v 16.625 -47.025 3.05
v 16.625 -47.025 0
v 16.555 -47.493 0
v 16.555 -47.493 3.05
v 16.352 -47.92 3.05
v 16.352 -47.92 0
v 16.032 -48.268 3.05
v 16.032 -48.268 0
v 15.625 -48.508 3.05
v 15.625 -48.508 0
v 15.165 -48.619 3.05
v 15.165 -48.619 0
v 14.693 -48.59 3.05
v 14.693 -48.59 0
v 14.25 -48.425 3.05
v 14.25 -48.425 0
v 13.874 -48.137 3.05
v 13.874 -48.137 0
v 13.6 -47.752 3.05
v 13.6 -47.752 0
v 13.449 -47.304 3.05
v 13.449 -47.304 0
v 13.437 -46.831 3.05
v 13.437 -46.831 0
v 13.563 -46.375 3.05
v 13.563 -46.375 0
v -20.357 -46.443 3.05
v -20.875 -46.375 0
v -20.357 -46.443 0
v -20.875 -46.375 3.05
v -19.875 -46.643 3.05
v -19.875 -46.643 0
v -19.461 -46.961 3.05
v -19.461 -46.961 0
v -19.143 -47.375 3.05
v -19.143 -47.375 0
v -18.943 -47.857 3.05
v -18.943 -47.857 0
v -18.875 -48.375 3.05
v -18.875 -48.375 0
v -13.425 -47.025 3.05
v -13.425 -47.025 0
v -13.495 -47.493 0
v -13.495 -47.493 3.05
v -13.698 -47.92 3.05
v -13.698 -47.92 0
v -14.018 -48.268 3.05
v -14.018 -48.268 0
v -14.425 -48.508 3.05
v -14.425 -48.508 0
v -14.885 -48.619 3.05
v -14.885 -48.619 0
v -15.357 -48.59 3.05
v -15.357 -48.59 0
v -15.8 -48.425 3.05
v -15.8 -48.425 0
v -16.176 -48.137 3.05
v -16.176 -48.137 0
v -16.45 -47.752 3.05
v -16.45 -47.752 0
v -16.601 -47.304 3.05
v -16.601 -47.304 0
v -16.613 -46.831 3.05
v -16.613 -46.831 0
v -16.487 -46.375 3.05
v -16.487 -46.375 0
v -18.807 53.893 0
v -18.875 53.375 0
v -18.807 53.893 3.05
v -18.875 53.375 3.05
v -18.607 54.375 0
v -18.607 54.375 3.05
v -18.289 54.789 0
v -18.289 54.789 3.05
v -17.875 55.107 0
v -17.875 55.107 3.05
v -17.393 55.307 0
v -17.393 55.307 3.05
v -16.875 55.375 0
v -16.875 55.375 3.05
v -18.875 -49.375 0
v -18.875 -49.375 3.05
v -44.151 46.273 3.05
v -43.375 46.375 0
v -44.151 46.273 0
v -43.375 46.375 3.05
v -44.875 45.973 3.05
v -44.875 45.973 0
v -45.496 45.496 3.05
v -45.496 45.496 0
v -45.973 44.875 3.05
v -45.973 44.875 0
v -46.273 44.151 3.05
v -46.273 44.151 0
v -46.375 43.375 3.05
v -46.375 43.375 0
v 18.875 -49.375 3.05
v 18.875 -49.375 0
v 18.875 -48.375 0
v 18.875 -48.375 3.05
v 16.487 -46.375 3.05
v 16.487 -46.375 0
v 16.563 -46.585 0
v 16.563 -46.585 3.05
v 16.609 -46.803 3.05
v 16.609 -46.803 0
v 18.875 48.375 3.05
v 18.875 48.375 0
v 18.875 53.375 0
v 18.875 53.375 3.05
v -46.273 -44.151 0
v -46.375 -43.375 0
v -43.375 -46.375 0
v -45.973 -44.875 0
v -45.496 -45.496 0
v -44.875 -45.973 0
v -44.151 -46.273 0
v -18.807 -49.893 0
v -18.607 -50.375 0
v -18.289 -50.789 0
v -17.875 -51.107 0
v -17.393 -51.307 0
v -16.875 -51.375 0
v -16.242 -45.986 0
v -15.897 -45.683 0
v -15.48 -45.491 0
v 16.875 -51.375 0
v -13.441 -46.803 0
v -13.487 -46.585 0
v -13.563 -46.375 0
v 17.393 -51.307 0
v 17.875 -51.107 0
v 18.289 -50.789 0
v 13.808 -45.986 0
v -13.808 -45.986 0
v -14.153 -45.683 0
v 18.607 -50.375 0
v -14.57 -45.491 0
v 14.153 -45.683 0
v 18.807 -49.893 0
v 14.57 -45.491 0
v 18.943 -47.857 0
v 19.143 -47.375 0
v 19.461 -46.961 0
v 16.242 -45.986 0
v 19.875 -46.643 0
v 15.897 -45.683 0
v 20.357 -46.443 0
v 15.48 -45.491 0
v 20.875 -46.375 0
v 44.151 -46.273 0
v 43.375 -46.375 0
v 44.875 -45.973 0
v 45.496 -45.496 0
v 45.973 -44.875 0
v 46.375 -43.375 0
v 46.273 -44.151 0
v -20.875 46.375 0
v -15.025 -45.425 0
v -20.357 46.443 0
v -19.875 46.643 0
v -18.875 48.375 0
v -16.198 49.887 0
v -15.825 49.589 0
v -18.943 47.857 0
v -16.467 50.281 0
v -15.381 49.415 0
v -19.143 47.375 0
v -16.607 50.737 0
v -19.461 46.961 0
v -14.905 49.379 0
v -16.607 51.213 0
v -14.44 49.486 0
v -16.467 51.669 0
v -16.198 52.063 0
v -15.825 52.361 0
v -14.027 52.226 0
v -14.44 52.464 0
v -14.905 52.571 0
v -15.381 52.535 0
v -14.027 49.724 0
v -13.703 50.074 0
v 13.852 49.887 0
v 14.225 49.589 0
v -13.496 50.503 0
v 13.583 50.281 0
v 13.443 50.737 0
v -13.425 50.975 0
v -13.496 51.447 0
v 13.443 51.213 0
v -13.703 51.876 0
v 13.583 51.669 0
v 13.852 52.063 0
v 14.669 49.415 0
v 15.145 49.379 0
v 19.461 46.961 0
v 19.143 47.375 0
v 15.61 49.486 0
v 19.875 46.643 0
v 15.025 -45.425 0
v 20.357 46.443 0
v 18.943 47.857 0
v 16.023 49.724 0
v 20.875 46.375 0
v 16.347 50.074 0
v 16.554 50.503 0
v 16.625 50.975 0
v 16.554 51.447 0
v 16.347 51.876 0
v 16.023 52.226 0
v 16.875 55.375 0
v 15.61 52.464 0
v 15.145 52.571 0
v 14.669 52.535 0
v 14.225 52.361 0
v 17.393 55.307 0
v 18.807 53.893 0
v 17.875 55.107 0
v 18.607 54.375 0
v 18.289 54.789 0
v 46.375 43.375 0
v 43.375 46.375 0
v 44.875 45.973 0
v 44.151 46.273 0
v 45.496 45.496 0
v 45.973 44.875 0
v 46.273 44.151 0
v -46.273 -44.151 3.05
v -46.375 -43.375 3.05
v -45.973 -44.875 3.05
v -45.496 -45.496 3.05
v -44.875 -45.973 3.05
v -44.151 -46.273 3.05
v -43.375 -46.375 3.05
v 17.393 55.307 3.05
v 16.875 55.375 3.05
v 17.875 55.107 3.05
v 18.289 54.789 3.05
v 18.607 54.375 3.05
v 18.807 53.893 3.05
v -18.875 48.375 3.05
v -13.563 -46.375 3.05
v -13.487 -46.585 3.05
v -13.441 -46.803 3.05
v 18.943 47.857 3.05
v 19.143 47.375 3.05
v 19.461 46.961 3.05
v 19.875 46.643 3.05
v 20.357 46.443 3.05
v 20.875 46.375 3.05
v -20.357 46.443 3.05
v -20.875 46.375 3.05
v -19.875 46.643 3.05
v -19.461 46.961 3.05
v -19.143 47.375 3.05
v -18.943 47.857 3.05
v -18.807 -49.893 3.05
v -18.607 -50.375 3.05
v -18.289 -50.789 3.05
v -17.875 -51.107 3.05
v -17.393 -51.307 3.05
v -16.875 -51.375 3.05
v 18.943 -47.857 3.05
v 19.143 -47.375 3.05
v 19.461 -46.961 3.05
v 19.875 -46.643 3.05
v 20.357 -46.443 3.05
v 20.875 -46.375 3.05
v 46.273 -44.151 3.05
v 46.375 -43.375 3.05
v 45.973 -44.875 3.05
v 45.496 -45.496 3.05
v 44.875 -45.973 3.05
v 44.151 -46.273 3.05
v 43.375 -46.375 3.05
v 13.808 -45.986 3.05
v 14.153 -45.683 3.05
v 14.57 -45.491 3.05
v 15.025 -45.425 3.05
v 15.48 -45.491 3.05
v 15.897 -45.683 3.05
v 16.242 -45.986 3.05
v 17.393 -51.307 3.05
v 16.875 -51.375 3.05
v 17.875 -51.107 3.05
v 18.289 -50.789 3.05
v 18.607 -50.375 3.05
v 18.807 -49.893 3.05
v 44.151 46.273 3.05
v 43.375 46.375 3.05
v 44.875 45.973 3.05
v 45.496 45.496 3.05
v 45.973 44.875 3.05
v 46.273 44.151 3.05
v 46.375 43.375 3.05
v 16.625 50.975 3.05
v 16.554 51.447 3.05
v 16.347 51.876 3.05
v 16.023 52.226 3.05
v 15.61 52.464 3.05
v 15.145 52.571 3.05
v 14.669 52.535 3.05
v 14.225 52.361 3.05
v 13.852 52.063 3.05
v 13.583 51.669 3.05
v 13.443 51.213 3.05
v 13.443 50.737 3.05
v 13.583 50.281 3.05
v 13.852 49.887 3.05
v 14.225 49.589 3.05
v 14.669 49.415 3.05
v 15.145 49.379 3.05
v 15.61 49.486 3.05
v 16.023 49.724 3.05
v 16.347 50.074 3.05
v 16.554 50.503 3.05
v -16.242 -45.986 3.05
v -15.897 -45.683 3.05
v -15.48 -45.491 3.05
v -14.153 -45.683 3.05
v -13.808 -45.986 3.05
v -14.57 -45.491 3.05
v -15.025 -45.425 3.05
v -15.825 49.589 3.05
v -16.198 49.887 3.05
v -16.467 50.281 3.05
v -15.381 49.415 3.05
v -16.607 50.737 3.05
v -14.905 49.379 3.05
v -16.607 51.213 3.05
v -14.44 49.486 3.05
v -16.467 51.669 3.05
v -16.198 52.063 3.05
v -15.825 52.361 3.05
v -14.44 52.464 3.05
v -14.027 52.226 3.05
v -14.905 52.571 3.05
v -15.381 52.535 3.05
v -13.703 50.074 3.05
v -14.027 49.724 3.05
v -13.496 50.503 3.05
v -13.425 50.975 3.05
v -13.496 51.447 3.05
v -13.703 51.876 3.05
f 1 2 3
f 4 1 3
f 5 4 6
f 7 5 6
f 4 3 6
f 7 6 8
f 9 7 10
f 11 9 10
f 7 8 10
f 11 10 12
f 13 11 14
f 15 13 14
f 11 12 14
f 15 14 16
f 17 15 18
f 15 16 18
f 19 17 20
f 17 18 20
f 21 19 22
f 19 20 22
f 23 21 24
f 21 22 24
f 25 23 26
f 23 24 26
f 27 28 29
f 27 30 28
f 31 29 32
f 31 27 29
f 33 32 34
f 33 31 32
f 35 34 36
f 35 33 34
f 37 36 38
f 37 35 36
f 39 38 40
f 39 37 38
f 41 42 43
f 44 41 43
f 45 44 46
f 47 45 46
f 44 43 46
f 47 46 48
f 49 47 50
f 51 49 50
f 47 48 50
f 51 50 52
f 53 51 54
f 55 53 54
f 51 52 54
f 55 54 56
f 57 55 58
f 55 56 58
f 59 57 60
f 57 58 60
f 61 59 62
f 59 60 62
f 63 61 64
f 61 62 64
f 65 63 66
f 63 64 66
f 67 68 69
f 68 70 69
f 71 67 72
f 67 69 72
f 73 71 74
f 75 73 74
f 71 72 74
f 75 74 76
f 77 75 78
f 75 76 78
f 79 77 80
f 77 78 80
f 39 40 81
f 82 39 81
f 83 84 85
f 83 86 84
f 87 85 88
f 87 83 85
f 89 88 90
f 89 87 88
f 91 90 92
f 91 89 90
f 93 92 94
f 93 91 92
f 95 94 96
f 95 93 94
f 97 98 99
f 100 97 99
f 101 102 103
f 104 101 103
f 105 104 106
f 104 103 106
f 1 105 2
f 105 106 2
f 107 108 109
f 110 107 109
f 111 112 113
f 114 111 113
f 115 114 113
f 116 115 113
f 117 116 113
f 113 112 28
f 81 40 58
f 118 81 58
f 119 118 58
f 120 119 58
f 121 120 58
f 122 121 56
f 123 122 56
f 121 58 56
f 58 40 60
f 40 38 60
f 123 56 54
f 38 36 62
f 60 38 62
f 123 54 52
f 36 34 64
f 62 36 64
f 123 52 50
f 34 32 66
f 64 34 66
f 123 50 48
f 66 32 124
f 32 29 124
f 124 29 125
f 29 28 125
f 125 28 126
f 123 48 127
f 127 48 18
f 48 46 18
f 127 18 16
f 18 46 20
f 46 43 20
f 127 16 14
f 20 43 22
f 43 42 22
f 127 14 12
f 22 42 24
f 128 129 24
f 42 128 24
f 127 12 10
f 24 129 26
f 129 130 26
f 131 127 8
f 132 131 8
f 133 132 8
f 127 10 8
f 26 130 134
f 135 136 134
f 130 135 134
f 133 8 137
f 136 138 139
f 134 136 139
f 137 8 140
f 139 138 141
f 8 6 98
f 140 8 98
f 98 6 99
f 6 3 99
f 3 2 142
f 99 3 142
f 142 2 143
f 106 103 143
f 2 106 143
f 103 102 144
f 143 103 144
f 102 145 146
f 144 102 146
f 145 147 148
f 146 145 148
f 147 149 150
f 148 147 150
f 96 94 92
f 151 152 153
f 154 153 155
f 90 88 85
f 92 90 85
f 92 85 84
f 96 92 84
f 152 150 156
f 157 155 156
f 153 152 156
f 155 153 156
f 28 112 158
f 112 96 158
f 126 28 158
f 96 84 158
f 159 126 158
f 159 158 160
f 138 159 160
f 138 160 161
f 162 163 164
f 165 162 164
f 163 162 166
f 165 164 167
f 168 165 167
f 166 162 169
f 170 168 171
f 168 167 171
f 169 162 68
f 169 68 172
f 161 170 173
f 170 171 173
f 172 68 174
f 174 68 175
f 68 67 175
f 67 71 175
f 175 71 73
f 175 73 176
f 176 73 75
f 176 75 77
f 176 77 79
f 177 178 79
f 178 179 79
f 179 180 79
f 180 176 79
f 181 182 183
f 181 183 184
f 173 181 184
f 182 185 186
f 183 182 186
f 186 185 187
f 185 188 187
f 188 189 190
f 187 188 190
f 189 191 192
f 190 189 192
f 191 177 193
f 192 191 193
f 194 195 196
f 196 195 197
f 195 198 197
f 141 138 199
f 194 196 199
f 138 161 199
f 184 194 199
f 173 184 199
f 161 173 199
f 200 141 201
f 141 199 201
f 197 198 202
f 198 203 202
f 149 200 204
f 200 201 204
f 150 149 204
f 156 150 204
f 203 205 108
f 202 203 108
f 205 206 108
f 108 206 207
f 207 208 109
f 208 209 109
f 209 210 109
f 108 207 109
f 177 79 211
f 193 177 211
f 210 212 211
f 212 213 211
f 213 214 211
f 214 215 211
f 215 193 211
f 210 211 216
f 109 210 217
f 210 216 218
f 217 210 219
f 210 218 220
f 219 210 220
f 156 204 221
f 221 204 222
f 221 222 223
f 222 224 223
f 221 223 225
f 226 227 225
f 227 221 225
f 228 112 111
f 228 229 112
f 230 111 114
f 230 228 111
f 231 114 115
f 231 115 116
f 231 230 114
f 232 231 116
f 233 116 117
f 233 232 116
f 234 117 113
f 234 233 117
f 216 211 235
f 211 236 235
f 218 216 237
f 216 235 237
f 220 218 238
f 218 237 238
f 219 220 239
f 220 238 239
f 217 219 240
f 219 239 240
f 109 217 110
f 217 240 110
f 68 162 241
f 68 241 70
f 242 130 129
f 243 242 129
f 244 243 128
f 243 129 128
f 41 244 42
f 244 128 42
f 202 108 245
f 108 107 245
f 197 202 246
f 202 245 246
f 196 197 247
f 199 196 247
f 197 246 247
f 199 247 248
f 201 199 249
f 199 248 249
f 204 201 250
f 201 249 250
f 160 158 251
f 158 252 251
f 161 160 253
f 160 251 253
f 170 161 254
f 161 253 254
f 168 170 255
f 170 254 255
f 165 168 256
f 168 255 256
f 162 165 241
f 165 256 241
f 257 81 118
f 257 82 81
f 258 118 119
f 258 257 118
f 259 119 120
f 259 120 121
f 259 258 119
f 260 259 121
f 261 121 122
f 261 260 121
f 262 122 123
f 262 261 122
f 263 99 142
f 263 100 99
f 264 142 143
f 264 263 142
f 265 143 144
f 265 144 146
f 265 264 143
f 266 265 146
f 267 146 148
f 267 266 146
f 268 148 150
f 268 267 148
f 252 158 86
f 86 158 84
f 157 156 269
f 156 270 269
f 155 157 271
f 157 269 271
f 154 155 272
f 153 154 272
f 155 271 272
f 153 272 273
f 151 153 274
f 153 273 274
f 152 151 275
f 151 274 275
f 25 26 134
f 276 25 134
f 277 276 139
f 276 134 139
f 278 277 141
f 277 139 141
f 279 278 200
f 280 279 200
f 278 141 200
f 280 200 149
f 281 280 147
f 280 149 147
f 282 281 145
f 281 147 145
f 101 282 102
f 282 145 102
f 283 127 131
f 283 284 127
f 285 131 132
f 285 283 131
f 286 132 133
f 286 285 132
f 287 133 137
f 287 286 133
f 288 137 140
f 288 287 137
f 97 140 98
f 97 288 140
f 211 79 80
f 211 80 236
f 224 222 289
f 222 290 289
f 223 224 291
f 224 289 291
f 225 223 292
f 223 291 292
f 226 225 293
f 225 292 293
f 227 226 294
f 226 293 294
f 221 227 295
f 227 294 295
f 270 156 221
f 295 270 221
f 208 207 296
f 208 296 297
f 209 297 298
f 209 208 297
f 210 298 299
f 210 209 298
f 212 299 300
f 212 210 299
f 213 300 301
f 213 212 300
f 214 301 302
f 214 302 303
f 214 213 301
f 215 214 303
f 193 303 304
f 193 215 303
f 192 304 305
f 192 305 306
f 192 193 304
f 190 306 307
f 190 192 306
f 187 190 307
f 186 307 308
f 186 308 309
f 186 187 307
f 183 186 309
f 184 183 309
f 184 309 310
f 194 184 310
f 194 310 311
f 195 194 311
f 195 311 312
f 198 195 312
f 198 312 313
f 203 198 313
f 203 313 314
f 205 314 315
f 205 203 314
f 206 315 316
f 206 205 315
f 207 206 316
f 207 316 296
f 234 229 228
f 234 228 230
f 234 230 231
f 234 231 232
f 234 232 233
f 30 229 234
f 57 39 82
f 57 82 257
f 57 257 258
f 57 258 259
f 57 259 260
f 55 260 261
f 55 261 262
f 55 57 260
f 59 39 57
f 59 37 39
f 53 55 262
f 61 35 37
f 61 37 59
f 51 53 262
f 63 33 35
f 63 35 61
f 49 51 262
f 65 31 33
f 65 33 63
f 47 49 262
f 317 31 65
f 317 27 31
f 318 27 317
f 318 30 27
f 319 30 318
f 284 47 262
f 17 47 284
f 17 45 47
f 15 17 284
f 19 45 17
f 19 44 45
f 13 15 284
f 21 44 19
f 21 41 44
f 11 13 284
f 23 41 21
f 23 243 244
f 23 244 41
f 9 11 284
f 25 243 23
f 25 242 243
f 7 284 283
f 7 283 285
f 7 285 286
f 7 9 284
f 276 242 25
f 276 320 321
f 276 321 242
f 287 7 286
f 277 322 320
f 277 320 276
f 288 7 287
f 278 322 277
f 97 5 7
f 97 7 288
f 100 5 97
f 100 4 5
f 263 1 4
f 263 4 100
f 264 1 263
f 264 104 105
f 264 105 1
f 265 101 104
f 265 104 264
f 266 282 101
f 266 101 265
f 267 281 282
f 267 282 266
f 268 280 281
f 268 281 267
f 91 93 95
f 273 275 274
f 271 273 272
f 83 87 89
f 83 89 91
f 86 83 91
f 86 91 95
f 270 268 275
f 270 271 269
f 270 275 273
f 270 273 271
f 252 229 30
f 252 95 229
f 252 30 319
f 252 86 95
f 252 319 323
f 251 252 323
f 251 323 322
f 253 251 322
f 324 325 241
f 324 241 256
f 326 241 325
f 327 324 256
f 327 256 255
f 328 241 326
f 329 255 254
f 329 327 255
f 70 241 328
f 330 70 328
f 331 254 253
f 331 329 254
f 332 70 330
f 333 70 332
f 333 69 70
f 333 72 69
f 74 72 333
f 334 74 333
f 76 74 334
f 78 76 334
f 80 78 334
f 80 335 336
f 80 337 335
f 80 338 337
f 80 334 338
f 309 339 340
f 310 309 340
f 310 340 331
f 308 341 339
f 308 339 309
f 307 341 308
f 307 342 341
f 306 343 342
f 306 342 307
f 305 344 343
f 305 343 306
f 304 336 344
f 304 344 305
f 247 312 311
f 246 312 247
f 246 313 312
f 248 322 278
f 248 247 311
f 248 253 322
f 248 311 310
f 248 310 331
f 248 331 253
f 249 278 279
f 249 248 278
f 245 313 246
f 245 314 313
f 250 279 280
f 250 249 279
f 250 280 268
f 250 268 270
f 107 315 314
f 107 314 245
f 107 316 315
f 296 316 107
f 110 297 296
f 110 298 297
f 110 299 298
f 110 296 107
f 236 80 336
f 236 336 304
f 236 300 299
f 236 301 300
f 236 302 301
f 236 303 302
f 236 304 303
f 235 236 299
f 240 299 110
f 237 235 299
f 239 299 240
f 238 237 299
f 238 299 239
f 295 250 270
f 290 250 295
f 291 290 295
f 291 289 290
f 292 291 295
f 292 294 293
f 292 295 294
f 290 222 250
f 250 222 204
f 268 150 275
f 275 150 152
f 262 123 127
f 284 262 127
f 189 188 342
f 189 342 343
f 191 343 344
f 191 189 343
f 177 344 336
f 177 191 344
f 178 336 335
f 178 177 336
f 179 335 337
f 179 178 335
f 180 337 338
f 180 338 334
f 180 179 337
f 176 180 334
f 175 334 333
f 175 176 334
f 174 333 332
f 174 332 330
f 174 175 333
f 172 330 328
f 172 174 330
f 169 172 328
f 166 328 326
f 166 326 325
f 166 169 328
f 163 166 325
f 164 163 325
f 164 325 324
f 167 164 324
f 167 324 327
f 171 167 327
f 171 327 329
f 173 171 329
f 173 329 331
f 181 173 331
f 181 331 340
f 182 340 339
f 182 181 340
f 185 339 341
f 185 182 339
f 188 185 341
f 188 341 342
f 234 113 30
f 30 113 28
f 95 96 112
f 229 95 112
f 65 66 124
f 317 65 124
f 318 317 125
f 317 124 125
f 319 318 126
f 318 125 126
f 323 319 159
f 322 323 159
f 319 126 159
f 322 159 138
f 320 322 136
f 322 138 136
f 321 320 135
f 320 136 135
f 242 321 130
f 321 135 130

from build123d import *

# Parameters (mm, degrees)
F0_W     = 37.75
F0_H     = 9
F0_R     = 1.6
F1_DEPTH = 3.05
F2_R     = 2
F3_R     = 3


with BuildPart() as f1:
    # F0 (on Top) → F1 (new body)
    with BuildSketch(Plane.XY):
        with BuildLine():
            Line((-18.875, 46.375), (-46.375, 46.375))
            Line((-46.375, 46.375), (-46.375, -46.375))
            Line((-46.375, -46.375), (-18.875, -46.375))
            Line((-18.875, -46.375), (-16.487019, -46.375))
            ThreePointArc((-16.487019, -46.375), (-15.025, -45.425), (-13.562981, -46.375))
            Line((-13.562981, -46.375), (13.562981, -46.375))
            ThreePointArc((13.562981, -46.375), (15.025, -45.425), (16.487019, -46.375))
            Line((16.487019, -46.375), (18.875, -46.375))
            Line((18.875, -46.375), (46.375, -46.375))
            Line((46.375, -46.375), (46.375, 46.375))
            Line((46.375, 46.375), (18.875, 46.375))
            Line((18.875, 46.375), (-18.875, 46.375))
        make_face()
        with BuildLine():
            Line((-16.487019, -46.375), (-18.875, -46.375))
            Line((-18.875, -46.375), (-18.875, -51.375))
            Line((-18.875, -51.375), (18.875, -51.375))
            Line((18.875, -51.375), (18.875, -46.375))
            Line((18.875, -46.375), (16.487019, -46.375))
            ThreePointArc((16.487019, -46.375), (16.590125, -46.692758), (16.625, -47.025))
            ThreePointArc((16.625, -47.025), (14.692758, -48.590125), (13.562981, -46.375))
            Line((13.562981, -46.375), (-13.562981, -46.375))
            ThreePointArc((-13.562981, -46.375), (-13.459875, -46.692758), (-13.425, -47.025))
            ThreePointArc((-13.425, -47.025), (-15.357242, -48.590125), (-16.487019, -46.375))
        make_face()
        with Locations((0, 50.875)):
            Rectangle(F0_W, F0_H)
        with Locations((-15.025, 50.975)):
            Circle(F0_R, mode=Mode.SUBTRACT)
        with Locations((15.025, 50.975)):
            Circle(F0_R, mode=Mode.SUBTRACT)
    extrude(amount=F1_DEPTH)

    # F2
    f2_edges = [f1.edges().sort_by_distance(p)[0] for p in [
        (18.875, 46.375, 1.525),
        (-18.875, 46.375, 1.525),
        (-18.875, -46.375, 1.525),
        (18.875, -46.375, 1.525),
        (-18.875, 55.375, 1.525),
        (18.875, 55.375, 1.525),
        (18.875, -51.375, 1.525),
        (-18.875, -51.375, 1.525),
    ]]
    fillet(f2_edges, radius=F2_R)

    # F3
    f3_edges = [f1.edges().sort_by_distance(p)[0] for p in [
        (-46.375, -46.375, 1.525),
        (46.375, -46.375, 1.525),
        (46.375, 46.375, 1.525),
        (-46.375, 46.375, 1.525),
    ]]
    fillet(f3_edges, radius=F3_R)


solid = f1.part
